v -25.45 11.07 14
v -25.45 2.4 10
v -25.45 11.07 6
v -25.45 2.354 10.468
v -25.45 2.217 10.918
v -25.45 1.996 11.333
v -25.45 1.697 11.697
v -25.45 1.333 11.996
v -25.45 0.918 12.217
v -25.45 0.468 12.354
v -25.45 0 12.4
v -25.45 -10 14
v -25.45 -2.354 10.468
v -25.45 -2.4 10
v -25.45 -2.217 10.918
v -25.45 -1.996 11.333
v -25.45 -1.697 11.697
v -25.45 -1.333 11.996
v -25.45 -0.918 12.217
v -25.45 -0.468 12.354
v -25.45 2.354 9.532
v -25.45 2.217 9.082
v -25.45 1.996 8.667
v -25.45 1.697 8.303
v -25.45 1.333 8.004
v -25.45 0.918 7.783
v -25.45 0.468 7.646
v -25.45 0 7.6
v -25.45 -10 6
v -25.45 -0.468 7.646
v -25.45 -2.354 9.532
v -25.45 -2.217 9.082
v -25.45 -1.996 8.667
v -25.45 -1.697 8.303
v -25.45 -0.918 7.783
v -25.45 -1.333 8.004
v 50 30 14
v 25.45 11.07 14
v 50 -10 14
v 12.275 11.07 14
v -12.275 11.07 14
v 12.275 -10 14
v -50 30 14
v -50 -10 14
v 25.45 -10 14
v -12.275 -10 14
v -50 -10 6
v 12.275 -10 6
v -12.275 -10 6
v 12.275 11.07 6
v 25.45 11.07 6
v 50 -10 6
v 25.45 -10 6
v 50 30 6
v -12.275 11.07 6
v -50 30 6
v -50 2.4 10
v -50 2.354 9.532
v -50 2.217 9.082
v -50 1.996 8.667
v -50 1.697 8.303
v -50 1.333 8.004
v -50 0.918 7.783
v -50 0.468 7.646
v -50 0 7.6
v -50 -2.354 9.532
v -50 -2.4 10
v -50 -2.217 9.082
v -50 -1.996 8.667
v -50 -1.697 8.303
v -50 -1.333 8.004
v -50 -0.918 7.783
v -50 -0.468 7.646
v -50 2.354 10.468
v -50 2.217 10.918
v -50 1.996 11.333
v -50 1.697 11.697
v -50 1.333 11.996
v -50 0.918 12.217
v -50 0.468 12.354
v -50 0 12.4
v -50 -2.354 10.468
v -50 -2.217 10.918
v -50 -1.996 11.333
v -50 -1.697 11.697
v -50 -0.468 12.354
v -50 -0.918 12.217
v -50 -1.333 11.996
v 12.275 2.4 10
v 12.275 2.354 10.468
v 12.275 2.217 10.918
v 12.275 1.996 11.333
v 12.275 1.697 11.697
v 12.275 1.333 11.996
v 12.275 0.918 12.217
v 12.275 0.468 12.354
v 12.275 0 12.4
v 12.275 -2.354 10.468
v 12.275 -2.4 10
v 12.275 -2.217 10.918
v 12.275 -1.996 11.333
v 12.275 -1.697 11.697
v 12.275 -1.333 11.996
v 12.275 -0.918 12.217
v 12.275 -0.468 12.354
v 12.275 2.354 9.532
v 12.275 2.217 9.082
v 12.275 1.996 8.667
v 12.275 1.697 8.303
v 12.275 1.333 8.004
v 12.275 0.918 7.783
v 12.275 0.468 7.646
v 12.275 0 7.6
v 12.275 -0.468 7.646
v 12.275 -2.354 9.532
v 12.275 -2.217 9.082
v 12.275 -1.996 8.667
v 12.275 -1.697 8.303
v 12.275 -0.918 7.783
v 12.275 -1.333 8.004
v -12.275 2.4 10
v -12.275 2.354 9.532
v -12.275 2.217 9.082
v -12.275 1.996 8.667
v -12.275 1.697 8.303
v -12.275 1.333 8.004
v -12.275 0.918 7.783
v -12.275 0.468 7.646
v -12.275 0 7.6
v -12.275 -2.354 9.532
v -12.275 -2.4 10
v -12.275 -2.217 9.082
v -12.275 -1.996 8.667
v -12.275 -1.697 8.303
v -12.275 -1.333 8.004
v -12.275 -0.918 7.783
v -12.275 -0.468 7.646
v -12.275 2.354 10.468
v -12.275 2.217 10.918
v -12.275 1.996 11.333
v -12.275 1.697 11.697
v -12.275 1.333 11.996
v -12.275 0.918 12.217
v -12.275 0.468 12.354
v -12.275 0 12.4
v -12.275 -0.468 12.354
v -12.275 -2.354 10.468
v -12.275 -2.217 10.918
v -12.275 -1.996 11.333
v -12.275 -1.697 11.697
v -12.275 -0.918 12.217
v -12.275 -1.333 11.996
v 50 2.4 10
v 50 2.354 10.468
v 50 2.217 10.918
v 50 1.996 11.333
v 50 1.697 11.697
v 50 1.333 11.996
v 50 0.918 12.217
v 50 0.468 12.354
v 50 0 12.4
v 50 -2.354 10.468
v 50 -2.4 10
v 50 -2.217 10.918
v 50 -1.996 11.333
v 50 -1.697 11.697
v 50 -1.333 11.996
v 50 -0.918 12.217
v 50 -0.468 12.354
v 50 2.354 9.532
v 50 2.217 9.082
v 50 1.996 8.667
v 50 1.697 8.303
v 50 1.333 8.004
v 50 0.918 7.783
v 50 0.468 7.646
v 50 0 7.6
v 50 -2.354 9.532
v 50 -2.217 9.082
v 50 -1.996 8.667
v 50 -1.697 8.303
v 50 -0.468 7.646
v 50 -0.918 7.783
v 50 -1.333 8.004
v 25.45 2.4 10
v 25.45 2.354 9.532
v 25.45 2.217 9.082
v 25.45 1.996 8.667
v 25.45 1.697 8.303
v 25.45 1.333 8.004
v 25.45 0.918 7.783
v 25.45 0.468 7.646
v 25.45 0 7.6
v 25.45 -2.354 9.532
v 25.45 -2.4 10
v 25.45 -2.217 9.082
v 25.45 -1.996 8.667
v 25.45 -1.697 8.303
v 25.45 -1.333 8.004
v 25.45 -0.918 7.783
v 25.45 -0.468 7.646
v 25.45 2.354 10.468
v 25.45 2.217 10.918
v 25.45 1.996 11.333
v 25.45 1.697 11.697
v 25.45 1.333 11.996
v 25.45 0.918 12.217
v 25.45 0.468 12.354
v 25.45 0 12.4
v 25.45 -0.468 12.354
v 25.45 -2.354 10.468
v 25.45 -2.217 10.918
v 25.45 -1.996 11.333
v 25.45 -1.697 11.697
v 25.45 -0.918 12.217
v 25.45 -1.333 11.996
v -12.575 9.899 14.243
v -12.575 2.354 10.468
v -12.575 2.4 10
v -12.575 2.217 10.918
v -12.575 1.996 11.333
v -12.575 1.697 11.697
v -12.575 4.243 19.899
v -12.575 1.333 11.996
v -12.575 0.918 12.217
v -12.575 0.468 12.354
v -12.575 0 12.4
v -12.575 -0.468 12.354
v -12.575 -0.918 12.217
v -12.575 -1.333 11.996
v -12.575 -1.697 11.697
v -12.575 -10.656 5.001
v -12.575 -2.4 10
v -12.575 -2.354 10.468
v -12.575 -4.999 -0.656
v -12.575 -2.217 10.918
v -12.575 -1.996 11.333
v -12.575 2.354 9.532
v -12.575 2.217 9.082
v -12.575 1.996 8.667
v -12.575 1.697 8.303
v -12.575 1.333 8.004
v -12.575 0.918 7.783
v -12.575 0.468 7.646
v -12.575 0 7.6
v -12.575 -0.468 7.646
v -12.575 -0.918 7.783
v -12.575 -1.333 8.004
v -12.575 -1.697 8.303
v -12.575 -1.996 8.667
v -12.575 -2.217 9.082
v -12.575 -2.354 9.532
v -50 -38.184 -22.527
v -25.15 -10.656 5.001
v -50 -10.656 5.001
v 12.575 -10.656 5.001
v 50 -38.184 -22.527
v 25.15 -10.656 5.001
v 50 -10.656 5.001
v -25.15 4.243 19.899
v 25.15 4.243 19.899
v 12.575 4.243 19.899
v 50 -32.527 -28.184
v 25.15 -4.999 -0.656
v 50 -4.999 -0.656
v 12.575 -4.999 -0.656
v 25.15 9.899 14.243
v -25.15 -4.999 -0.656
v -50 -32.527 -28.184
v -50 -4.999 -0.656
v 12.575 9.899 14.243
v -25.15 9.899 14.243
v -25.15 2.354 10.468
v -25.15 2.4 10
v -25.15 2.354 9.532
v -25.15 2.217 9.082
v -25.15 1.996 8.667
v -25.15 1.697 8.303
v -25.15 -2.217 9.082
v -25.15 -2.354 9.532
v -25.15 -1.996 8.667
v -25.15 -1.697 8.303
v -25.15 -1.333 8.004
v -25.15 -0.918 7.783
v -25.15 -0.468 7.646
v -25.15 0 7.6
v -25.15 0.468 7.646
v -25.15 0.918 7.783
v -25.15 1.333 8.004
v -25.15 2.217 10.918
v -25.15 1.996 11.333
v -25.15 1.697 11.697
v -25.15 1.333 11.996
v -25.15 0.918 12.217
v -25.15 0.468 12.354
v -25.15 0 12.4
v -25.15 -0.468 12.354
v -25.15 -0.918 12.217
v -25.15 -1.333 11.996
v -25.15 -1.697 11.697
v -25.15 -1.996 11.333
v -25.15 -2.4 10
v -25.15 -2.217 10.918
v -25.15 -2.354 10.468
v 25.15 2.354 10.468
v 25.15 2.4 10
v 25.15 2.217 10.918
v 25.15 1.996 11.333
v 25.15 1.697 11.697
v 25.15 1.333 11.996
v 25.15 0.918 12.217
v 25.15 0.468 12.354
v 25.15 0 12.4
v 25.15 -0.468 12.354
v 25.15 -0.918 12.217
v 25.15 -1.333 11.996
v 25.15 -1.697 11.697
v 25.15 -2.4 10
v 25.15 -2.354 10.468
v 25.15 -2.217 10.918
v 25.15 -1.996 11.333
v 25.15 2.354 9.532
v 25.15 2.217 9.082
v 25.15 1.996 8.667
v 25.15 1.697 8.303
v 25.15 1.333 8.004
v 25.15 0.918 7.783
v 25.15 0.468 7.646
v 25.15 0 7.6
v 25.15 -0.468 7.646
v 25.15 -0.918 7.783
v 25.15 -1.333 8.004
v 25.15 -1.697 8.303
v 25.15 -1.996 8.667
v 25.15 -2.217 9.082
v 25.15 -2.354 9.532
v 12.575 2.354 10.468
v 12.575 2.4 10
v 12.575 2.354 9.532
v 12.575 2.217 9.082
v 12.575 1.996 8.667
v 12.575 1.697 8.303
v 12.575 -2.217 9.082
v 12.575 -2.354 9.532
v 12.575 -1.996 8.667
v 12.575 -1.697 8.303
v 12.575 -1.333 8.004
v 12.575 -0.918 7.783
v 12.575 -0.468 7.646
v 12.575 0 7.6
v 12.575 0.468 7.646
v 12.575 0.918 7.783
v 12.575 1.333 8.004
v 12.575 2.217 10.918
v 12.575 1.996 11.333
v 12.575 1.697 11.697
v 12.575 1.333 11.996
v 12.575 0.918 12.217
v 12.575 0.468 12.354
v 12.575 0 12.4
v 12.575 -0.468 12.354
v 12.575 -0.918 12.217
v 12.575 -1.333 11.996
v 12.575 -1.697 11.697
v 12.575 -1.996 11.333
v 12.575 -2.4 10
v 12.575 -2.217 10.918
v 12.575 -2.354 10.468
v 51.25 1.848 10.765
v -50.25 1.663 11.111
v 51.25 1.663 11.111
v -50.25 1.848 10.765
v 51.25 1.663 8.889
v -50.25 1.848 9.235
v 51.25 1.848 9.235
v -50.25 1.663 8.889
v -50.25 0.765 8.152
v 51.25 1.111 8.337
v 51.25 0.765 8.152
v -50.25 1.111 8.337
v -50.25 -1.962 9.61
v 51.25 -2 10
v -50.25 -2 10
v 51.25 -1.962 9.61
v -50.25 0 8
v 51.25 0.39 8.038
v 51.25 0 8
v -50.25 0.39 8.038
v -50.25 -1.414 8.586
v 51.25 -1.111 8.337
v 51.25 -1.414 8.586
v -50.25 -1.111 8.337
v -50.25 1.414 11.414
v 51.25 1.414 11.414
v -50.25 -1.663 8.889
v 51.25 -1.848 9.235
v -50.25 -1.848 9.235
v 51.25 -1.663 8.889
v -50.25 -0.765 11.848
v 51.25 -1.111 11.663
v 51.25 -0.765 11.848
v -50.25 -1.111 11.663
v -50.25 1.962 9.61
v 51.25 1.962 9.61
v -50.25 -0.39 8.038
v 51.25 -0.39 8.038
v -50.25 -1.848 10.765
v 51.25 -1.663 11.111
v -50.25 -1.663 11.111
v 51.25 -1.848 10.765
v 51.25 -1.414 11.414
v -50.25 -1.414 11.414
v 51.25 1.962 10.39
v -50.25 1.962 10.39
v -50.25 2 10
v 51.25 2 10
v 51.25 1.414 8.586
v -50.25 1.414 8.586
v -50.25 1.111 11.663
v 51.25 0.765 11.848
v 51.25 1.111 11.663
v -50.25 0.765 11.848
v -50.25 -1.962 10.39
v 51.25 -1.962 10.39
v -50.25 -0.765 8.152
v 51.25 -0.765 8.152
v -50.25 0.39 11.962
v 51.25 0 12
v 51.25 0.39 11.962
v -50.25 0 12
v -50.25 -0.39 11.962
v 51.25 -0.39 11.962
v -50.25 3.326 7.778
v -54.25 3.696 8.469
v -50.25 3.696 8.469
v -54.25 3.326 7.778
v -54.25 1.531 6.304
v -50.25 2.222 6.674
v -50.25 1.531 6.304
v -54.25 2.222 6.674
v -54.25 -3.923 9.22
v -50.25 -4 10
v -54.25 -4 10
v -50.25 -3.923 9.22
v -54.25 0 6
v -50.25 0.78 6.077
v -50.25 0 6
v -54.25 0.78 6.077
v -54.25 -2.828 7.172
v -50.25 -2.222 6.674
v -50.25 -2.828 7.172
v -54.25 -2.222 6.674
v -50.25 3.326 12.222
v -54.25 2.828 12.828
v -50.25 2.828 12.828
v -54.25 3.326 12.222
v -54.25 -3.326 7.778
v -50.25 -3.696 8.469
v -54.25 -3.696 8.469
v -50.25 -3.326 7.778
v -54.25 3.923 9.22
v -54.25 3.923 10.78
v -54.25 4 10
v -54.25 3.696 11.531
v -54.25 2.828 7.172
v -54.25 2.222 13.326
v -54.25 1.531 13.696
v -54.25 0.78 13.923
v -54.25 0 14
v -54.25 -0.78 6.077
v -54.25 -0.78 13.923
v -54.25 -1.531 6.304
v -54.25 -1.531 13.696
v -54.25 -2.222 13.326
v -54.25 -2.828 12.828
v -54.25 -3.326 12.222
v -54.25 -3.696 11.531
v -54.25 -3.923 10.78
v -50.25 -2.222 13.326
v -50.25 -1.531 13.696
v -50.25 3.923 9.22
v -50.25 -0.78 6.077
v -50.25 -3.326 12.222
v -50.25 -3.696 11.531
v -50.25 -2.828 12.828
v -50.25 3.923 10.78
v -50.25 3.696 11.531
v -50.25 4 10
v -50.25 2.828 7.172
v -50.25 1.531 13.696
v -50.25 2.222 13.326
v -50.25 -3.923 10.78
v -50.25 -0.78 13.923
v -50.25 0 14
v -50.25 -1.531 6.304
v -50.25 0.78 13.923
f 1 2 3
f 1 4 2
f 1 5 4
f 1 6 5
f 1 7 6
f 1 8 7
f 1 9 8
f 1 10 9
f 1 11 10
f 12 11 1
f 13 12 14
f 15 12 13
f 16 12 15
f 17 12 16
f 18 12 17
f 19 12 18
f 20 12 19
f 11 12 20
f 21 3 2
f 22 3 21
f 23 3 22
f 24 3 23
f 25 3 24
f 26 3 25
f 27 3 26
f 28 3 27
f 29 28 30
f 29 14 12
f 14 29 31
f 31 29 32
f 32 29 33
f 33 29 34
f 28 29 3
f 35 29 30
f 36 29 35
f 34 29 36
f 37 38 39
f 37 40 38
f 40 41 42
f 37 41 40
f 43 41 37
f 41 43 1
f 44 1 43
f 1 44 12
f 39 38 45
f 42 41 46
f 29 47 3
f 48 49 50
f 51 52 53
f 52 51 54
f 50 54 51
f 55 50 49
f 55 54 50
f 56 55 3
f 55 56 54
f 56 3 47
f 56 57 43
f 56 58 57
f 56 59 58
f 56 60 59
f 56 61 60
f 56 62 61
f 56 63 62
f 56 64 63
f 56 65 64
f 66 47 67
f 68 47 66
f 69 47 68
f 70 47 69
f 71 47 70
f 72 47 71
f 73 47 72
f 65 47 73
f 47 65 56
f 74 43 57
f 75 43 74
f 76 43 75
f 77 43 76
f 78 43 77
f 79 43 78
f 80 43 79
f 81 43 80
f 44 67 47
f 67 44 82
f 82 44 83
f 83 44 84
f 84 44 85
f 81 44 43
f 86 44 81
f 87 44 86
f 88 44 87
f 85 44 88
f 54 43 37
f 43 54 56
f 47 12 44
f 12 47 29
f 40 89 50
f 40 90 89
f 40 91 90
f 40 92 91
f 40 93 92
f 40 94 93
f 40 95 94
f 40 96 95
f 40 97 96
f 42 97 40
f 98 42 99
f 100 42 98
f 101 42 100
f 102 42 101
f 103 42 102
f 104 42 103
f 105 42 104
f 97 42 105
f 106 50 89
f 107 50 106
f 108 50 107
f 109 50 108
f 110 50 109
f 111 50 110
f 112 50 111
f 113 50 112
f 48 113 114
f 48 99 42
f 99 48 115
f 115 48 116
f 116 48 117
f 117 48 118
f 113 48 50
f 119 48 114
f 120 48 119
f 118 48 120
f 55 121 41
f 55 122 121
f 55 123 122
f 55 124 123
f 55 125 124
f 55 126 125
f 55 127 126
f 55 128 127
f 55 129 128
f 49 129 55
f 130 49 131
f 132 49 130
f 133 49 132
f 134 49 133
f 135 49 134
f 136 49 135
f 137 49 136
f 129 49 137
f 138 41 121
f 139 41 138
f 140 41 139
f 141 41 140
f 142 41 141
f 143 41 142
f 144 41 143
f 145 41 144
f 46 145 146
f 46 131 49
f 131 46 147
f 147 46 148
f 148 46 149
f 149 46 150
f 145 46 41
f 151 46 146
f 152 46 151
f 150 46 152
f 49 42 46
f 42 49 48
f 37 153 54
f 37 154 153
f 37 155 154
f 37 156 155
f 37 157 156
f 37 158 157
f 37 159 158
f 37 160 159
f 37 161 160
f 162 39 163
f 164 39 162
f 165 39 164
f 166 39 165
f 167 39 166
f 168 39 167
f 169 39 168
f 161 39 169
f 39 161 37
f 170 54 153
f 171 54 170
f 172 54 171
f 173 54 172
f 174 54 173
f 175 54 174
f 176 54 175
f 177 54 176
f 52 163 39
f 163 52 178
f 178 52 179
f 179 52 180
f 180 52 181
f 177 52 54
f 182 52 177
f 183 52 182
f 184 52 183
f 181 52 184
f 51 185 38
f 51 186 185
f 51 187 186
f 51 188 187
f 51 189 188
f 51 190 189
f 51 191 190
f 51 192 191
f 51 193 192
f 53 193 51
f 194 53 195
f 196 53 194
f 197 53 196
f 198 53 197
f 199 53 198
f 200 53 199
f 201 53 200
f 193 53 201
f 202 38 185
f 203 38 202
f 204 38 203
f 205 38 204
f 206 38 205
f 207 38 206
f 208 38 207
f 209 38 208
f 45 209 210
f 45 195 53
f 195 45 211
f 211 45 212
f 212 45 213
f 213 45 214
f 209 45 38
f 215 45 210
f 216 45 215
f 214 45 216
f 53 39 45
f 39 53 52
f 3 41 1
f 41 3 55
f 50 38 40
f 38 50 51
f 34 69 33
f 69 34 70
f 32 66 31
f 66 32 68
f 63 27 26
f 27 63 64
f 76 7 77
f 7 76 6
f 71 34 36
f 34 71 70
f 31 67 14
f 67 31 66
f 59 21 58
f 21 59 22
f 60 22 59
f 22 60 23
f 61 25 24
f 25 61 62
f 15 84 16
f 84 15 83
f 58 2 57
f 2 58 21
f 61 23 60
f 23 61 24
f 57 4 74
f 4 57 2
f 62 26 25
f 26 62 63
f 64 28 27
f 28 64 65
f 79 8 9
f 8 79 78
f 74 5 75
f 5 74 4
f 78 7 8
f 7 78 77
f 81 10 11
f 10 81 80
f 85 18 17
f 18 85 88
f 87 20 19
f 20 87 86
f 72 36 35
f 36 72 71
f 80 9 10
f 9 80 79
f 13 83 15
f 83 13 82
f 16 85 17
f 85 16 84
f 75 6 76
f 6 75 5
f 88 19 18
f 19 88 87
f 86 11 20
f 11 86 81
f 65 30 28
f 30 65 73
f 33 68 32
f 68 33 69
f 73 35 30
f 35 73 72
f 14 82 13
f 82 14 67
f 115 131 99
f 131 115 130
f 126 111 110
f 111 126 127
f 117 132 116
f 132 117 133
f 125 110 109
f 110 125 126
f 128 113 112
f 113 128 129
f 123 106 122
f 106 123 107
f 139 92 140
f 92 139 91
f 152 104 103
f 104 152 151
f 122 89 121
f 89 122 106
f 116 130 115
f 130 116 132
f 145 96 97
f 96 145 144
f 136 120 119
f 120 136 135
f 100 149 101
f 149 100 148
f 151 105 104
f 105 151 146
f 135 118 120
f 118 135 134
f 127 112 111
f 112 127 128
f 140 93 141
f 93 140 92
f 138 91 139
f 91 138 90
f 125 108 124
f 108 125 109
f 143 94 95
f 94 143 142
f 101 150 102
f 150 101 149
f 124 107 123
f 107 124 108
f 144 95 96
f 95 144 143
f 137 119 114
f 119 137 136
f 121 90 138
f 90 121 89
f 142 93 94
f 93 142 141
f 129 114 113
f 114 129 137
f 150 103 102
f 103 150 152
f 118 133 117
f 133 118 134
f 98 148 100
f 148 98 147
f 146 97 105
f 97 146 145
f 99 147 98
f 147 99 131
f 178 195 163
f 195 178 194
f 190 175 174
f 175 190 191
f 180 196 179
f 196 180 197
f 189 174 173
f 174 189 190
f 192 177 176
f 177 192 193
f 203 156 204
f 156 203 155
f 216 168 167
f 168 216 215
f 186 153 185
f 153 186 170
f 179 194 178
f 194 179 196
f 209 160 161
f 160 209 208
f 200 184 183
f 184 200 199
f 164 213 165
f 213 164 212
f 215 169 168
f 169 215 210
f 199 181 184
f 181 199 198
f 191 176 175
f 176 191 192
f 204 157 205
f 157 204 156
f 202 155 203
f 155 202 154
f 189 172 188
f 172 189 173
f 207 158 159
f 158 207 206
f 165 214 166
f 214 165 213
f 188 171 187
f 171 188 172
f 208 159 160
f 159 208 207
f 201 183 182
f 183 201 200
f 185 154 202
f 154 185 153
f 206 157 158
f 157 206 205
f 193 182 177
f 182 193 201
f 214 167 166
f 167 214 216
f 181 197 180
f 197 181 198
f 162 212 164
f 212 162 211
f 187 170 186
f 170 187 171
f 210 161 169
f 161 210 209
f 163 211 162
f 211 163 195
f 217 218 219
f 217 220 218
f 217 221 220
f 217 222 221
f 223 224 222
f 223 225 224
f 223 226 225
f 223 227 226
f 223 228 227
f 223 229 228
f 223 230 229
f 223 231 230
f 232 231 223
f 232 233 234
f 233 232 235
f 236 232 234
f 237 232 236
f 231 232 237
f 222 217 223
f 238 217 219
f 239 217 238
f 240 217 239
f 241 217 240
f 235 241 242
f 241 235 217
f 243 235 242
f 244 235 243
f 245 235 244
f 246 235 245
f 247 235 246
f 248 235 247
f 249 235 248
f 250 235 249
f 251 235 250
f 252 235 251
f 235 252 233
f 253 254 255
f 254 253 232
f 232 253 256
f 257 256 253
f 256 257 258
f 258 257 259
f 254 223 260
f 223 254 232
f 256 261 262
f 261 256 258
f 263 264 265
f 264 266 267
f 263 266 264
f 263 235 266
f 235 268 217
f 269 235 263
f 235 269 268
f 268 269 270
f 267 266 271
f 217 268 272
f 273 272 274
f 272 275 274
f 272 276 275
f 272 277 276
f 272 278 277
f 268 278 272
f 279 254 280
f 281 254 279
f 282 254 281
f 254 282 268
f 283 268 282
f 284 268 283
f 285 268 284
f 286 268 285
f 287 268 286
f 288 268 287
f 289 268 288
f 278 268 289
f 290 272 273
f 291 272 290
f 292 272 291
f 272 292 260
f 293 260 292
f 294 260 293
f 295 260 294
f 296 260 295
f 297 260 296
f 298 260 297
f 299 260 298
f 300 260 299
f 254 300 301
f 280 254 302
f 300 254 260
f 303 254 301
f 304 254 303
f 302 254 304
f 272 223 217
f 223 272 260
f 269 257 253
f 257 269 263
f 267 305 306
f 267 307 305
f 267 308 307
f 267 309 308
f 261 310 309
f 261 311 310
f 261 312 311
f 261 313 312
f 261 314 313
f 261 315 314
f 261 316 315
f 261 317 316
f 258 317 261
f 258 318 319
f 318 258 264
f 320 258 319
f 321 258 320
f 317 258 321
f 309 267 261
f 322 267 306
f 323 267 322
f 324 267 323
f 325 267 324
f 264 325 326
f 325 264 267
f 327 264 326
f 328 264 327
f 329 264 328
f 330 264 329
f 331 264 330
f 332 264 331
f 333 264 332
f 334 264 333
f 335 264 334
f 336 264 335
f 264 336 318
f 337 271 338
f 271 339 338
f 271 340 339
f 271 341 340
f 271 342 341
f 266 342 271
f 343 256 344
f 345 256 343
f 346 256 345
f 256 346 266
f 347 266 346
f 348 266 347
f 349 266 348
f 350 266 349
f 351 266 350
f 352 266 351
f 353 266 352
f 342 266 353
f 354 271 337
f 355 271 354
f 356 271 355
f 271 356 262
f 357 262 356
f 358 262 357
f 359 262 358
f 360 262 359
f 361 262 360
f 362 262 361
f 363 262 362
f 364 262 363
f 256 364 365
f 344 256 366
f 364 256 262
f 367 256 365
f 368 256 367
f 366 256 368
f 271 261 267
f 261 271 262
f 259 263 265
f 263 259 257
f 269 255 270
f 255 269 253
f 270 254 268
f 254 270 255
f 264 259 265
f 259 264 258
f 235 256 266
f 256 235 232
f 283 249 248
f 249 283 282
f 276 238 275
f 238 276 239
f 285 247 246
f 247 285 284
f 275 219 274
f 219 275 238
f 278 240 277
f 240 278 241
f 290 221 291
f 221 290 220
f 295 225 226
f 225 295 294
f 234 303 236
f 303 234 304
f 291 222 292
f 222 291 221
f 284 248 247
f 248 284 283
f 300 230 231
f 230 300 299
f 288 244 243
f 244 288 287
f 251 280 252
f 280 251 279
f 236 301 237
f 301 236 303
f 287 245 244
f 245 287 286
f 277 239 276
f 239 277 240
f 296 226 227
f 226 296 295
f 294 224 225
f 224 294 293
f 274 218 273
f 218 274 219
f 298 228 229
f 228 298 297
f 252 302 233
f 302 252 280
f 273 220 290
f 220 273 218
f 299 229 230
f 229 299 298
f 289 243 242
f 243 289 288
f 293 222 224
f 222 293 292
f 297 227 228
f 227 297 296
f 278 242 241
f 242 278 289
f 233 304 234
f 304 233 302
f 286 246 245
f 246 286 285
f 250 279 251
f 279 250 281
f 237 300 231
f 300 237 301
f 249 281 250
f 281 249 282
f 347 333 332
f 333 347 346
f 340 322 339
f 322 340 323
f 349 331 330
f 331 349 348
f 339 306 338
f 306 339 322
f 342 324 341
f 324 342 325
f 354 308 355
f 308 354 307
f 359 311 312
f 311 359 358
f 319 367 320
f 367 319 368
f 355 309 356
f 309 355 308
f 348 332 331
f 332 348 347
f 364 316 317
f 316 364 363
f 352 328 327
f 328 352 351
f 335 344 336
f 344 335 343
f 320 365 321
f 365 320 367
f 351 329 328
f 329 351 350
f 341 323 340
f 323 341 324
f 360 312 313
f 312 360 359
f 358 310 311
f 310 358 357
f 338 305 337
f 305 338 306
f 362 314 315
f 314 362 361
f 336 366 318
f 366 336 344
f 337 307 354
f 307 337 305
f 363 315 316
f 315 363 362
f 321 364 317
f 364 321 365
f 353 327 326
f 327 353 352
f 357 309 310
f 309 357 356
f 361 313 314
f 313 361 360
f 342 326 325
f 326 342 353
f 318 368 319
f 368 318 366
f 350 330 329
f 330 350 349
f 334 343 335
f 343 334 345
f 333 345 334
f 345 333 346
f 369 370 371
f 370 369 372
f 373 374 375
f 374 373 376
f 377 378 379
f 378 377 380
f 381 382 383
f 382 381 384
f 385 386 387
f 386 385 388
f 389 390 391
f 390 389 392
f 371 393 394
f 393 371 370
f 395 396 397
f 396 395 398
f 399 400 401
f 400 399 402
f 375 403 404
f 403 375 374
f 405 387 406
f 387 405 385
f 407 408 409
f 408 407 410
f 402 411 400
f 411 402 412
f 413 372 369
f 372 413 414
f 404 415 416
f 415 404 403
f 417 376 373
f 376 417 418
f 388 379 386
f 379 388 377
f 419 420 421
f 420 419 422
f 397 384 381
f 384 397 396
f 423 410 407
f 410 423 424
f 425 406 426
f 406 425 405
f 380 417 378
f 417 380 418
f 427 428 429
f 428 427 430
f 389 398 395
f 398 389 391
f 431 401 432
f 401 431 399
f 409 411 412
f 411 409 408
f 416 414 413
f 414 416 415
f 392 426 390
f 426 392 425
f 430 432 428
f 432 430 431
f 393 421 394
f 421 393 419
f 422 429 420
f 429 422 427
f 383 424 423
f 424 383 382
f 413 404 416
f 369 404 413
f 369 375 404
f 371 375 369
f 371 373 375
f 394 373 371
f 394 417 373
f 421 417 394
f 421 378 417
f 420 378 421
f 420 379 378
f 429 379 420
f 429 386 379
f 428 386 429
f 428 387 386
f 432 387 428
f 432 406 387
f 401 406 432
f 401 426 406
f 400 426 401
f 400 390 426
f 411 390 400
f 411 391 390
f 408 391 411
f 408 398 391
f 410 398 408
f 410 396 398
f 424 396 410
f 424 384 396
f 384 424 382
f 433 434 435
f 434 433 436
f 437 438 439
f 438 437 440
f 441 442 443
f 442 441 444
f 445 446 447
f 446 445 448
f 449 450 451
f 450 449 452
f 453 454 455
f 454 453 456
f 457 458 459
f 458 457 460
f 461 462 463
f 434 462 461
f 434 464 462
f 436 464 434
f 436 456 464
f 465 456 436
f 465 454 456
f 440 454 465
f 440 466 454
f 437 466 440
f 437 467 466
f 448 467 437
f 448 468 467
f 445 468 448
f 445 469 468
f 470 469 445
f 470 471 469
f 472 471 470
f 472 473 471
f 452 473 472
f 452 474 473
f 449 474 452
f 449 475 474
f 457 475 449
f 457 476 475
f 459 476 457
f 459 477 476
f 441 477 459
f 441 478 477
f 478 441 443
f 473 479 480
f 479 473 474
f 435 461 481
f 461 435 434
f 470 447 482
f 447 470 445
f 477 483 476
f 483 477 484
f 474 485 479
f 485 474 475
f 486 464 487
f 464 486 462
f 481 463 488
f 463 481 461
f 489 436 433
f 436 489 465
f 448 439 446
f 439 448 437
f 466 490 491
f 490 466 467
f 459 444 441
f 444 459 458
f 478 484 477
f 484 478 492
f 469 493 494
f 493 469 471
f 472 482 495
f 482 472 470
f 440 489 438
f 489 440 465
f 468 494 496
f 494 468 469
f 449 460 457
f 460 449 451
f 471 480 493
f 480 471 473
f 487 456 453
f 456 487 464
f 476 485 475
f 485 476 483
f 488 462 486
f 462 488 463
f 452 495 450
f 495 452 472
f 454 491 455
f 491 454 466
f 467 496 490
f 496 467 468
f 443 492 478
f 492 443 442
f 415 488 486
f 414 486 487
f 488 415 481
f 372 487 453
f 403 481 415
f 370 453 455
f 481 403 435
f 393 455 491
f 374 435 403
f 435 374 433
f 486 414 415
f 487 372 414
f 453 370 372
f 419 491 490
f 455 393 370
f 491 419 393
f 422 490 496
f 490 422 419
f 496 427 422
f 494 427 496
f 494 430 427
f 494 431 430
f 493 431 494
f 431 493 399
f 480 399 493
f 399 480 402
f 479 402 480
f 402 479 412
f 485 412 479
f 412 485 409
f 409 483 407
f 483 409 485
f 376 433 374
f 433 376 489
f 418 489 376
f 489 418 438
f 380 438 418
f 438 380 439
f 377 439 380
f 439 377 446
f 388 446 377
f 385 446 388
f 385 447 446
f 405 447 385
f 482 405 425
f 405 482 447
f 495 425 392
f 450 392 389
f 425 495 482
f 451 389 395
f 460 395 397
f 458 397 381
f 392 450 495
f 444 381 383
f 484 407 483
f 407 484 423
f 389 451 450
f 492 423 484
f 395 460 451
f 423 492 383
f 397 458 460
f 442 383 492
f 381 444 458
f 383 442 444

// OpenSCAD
$fn = 32;

// ------------------------------------------------------------------------
// Butt hinge: hinge 100 mm, leaf swung 45 deg
// Every part is its own module, assembly() places every instance.
// ------------------------------------------------------------------------

// --- part 1 ---
module hinge_base() {
  difference() {
    union() {
      translate([-50, -10, -4]) cube([24.55, 40, 8]);
      translate([-12.275, -10, -4]) cube([24.55, 40, 8]);
      translate([25.45, -10, -4]) cube([24.55, 40, 8]);
      translate([-50, 11.07, -4]) cube([100, 18.93, 8]);
    }
    translate([-37.725, 0, 0]) rotate([0, 90, 0]) cylinder(h = 26.55, d = 4.8, center = true);
    translate([0, 0, 0]) rotate([0, 90, 0]) cylinder(h = 26.55, d = 4.8, center = true);
    translate([37.725, 0, 0]) rotate([0, 90, 0]) cylinder(h = 26.55, d = 4.8, center = true);
  }
}

// --- part 2 ---
module hinge_mover() {
  difference() {
    union() {
      translate([-25.15, -50, -4]) cube([12.575, 60, 8]);
      translate([12.575, -50, -4]) cube([12.575, 60, 8]);
      translate([-50, -50, -4]) cube([100, 38.93, 8]);
    }
    translate([-18.863, 0, 0]) rotate([0, 90, 0]) cylinder(h = 14.575, d = 4.8, center = true);
    translate([18.863, 0, 0]) rotate([0, 90, 0]) cylinder(h = 14.575, d = 4.8, center = true);
  }
}

// --- part 3 ---
module hinge_pin() {
  rotate([0, 90, 0]) cylinder(h = 102.5, d = 4, center = true);
  translate([-54.25, 0, 0]) rotate([0, 90, 0]) cylinder(h = 4, d = 8);
}

// --- assembly ---
module assembly() {
  color([0.80, 0.24, 0.20]) translate([0, 0, 10]) rotate([0, 0, 0]) hinge_base();
  color([0.20, 0.45, 0.75]) translate([0, 0, 10]) rotate([45, 0, 0]) hinge_mover();
  color([0.25, 0.62, 0.32]) translate([0, 0, 10]) rotate([0, 0, 0]) hinge_pin();
}

assembly();
